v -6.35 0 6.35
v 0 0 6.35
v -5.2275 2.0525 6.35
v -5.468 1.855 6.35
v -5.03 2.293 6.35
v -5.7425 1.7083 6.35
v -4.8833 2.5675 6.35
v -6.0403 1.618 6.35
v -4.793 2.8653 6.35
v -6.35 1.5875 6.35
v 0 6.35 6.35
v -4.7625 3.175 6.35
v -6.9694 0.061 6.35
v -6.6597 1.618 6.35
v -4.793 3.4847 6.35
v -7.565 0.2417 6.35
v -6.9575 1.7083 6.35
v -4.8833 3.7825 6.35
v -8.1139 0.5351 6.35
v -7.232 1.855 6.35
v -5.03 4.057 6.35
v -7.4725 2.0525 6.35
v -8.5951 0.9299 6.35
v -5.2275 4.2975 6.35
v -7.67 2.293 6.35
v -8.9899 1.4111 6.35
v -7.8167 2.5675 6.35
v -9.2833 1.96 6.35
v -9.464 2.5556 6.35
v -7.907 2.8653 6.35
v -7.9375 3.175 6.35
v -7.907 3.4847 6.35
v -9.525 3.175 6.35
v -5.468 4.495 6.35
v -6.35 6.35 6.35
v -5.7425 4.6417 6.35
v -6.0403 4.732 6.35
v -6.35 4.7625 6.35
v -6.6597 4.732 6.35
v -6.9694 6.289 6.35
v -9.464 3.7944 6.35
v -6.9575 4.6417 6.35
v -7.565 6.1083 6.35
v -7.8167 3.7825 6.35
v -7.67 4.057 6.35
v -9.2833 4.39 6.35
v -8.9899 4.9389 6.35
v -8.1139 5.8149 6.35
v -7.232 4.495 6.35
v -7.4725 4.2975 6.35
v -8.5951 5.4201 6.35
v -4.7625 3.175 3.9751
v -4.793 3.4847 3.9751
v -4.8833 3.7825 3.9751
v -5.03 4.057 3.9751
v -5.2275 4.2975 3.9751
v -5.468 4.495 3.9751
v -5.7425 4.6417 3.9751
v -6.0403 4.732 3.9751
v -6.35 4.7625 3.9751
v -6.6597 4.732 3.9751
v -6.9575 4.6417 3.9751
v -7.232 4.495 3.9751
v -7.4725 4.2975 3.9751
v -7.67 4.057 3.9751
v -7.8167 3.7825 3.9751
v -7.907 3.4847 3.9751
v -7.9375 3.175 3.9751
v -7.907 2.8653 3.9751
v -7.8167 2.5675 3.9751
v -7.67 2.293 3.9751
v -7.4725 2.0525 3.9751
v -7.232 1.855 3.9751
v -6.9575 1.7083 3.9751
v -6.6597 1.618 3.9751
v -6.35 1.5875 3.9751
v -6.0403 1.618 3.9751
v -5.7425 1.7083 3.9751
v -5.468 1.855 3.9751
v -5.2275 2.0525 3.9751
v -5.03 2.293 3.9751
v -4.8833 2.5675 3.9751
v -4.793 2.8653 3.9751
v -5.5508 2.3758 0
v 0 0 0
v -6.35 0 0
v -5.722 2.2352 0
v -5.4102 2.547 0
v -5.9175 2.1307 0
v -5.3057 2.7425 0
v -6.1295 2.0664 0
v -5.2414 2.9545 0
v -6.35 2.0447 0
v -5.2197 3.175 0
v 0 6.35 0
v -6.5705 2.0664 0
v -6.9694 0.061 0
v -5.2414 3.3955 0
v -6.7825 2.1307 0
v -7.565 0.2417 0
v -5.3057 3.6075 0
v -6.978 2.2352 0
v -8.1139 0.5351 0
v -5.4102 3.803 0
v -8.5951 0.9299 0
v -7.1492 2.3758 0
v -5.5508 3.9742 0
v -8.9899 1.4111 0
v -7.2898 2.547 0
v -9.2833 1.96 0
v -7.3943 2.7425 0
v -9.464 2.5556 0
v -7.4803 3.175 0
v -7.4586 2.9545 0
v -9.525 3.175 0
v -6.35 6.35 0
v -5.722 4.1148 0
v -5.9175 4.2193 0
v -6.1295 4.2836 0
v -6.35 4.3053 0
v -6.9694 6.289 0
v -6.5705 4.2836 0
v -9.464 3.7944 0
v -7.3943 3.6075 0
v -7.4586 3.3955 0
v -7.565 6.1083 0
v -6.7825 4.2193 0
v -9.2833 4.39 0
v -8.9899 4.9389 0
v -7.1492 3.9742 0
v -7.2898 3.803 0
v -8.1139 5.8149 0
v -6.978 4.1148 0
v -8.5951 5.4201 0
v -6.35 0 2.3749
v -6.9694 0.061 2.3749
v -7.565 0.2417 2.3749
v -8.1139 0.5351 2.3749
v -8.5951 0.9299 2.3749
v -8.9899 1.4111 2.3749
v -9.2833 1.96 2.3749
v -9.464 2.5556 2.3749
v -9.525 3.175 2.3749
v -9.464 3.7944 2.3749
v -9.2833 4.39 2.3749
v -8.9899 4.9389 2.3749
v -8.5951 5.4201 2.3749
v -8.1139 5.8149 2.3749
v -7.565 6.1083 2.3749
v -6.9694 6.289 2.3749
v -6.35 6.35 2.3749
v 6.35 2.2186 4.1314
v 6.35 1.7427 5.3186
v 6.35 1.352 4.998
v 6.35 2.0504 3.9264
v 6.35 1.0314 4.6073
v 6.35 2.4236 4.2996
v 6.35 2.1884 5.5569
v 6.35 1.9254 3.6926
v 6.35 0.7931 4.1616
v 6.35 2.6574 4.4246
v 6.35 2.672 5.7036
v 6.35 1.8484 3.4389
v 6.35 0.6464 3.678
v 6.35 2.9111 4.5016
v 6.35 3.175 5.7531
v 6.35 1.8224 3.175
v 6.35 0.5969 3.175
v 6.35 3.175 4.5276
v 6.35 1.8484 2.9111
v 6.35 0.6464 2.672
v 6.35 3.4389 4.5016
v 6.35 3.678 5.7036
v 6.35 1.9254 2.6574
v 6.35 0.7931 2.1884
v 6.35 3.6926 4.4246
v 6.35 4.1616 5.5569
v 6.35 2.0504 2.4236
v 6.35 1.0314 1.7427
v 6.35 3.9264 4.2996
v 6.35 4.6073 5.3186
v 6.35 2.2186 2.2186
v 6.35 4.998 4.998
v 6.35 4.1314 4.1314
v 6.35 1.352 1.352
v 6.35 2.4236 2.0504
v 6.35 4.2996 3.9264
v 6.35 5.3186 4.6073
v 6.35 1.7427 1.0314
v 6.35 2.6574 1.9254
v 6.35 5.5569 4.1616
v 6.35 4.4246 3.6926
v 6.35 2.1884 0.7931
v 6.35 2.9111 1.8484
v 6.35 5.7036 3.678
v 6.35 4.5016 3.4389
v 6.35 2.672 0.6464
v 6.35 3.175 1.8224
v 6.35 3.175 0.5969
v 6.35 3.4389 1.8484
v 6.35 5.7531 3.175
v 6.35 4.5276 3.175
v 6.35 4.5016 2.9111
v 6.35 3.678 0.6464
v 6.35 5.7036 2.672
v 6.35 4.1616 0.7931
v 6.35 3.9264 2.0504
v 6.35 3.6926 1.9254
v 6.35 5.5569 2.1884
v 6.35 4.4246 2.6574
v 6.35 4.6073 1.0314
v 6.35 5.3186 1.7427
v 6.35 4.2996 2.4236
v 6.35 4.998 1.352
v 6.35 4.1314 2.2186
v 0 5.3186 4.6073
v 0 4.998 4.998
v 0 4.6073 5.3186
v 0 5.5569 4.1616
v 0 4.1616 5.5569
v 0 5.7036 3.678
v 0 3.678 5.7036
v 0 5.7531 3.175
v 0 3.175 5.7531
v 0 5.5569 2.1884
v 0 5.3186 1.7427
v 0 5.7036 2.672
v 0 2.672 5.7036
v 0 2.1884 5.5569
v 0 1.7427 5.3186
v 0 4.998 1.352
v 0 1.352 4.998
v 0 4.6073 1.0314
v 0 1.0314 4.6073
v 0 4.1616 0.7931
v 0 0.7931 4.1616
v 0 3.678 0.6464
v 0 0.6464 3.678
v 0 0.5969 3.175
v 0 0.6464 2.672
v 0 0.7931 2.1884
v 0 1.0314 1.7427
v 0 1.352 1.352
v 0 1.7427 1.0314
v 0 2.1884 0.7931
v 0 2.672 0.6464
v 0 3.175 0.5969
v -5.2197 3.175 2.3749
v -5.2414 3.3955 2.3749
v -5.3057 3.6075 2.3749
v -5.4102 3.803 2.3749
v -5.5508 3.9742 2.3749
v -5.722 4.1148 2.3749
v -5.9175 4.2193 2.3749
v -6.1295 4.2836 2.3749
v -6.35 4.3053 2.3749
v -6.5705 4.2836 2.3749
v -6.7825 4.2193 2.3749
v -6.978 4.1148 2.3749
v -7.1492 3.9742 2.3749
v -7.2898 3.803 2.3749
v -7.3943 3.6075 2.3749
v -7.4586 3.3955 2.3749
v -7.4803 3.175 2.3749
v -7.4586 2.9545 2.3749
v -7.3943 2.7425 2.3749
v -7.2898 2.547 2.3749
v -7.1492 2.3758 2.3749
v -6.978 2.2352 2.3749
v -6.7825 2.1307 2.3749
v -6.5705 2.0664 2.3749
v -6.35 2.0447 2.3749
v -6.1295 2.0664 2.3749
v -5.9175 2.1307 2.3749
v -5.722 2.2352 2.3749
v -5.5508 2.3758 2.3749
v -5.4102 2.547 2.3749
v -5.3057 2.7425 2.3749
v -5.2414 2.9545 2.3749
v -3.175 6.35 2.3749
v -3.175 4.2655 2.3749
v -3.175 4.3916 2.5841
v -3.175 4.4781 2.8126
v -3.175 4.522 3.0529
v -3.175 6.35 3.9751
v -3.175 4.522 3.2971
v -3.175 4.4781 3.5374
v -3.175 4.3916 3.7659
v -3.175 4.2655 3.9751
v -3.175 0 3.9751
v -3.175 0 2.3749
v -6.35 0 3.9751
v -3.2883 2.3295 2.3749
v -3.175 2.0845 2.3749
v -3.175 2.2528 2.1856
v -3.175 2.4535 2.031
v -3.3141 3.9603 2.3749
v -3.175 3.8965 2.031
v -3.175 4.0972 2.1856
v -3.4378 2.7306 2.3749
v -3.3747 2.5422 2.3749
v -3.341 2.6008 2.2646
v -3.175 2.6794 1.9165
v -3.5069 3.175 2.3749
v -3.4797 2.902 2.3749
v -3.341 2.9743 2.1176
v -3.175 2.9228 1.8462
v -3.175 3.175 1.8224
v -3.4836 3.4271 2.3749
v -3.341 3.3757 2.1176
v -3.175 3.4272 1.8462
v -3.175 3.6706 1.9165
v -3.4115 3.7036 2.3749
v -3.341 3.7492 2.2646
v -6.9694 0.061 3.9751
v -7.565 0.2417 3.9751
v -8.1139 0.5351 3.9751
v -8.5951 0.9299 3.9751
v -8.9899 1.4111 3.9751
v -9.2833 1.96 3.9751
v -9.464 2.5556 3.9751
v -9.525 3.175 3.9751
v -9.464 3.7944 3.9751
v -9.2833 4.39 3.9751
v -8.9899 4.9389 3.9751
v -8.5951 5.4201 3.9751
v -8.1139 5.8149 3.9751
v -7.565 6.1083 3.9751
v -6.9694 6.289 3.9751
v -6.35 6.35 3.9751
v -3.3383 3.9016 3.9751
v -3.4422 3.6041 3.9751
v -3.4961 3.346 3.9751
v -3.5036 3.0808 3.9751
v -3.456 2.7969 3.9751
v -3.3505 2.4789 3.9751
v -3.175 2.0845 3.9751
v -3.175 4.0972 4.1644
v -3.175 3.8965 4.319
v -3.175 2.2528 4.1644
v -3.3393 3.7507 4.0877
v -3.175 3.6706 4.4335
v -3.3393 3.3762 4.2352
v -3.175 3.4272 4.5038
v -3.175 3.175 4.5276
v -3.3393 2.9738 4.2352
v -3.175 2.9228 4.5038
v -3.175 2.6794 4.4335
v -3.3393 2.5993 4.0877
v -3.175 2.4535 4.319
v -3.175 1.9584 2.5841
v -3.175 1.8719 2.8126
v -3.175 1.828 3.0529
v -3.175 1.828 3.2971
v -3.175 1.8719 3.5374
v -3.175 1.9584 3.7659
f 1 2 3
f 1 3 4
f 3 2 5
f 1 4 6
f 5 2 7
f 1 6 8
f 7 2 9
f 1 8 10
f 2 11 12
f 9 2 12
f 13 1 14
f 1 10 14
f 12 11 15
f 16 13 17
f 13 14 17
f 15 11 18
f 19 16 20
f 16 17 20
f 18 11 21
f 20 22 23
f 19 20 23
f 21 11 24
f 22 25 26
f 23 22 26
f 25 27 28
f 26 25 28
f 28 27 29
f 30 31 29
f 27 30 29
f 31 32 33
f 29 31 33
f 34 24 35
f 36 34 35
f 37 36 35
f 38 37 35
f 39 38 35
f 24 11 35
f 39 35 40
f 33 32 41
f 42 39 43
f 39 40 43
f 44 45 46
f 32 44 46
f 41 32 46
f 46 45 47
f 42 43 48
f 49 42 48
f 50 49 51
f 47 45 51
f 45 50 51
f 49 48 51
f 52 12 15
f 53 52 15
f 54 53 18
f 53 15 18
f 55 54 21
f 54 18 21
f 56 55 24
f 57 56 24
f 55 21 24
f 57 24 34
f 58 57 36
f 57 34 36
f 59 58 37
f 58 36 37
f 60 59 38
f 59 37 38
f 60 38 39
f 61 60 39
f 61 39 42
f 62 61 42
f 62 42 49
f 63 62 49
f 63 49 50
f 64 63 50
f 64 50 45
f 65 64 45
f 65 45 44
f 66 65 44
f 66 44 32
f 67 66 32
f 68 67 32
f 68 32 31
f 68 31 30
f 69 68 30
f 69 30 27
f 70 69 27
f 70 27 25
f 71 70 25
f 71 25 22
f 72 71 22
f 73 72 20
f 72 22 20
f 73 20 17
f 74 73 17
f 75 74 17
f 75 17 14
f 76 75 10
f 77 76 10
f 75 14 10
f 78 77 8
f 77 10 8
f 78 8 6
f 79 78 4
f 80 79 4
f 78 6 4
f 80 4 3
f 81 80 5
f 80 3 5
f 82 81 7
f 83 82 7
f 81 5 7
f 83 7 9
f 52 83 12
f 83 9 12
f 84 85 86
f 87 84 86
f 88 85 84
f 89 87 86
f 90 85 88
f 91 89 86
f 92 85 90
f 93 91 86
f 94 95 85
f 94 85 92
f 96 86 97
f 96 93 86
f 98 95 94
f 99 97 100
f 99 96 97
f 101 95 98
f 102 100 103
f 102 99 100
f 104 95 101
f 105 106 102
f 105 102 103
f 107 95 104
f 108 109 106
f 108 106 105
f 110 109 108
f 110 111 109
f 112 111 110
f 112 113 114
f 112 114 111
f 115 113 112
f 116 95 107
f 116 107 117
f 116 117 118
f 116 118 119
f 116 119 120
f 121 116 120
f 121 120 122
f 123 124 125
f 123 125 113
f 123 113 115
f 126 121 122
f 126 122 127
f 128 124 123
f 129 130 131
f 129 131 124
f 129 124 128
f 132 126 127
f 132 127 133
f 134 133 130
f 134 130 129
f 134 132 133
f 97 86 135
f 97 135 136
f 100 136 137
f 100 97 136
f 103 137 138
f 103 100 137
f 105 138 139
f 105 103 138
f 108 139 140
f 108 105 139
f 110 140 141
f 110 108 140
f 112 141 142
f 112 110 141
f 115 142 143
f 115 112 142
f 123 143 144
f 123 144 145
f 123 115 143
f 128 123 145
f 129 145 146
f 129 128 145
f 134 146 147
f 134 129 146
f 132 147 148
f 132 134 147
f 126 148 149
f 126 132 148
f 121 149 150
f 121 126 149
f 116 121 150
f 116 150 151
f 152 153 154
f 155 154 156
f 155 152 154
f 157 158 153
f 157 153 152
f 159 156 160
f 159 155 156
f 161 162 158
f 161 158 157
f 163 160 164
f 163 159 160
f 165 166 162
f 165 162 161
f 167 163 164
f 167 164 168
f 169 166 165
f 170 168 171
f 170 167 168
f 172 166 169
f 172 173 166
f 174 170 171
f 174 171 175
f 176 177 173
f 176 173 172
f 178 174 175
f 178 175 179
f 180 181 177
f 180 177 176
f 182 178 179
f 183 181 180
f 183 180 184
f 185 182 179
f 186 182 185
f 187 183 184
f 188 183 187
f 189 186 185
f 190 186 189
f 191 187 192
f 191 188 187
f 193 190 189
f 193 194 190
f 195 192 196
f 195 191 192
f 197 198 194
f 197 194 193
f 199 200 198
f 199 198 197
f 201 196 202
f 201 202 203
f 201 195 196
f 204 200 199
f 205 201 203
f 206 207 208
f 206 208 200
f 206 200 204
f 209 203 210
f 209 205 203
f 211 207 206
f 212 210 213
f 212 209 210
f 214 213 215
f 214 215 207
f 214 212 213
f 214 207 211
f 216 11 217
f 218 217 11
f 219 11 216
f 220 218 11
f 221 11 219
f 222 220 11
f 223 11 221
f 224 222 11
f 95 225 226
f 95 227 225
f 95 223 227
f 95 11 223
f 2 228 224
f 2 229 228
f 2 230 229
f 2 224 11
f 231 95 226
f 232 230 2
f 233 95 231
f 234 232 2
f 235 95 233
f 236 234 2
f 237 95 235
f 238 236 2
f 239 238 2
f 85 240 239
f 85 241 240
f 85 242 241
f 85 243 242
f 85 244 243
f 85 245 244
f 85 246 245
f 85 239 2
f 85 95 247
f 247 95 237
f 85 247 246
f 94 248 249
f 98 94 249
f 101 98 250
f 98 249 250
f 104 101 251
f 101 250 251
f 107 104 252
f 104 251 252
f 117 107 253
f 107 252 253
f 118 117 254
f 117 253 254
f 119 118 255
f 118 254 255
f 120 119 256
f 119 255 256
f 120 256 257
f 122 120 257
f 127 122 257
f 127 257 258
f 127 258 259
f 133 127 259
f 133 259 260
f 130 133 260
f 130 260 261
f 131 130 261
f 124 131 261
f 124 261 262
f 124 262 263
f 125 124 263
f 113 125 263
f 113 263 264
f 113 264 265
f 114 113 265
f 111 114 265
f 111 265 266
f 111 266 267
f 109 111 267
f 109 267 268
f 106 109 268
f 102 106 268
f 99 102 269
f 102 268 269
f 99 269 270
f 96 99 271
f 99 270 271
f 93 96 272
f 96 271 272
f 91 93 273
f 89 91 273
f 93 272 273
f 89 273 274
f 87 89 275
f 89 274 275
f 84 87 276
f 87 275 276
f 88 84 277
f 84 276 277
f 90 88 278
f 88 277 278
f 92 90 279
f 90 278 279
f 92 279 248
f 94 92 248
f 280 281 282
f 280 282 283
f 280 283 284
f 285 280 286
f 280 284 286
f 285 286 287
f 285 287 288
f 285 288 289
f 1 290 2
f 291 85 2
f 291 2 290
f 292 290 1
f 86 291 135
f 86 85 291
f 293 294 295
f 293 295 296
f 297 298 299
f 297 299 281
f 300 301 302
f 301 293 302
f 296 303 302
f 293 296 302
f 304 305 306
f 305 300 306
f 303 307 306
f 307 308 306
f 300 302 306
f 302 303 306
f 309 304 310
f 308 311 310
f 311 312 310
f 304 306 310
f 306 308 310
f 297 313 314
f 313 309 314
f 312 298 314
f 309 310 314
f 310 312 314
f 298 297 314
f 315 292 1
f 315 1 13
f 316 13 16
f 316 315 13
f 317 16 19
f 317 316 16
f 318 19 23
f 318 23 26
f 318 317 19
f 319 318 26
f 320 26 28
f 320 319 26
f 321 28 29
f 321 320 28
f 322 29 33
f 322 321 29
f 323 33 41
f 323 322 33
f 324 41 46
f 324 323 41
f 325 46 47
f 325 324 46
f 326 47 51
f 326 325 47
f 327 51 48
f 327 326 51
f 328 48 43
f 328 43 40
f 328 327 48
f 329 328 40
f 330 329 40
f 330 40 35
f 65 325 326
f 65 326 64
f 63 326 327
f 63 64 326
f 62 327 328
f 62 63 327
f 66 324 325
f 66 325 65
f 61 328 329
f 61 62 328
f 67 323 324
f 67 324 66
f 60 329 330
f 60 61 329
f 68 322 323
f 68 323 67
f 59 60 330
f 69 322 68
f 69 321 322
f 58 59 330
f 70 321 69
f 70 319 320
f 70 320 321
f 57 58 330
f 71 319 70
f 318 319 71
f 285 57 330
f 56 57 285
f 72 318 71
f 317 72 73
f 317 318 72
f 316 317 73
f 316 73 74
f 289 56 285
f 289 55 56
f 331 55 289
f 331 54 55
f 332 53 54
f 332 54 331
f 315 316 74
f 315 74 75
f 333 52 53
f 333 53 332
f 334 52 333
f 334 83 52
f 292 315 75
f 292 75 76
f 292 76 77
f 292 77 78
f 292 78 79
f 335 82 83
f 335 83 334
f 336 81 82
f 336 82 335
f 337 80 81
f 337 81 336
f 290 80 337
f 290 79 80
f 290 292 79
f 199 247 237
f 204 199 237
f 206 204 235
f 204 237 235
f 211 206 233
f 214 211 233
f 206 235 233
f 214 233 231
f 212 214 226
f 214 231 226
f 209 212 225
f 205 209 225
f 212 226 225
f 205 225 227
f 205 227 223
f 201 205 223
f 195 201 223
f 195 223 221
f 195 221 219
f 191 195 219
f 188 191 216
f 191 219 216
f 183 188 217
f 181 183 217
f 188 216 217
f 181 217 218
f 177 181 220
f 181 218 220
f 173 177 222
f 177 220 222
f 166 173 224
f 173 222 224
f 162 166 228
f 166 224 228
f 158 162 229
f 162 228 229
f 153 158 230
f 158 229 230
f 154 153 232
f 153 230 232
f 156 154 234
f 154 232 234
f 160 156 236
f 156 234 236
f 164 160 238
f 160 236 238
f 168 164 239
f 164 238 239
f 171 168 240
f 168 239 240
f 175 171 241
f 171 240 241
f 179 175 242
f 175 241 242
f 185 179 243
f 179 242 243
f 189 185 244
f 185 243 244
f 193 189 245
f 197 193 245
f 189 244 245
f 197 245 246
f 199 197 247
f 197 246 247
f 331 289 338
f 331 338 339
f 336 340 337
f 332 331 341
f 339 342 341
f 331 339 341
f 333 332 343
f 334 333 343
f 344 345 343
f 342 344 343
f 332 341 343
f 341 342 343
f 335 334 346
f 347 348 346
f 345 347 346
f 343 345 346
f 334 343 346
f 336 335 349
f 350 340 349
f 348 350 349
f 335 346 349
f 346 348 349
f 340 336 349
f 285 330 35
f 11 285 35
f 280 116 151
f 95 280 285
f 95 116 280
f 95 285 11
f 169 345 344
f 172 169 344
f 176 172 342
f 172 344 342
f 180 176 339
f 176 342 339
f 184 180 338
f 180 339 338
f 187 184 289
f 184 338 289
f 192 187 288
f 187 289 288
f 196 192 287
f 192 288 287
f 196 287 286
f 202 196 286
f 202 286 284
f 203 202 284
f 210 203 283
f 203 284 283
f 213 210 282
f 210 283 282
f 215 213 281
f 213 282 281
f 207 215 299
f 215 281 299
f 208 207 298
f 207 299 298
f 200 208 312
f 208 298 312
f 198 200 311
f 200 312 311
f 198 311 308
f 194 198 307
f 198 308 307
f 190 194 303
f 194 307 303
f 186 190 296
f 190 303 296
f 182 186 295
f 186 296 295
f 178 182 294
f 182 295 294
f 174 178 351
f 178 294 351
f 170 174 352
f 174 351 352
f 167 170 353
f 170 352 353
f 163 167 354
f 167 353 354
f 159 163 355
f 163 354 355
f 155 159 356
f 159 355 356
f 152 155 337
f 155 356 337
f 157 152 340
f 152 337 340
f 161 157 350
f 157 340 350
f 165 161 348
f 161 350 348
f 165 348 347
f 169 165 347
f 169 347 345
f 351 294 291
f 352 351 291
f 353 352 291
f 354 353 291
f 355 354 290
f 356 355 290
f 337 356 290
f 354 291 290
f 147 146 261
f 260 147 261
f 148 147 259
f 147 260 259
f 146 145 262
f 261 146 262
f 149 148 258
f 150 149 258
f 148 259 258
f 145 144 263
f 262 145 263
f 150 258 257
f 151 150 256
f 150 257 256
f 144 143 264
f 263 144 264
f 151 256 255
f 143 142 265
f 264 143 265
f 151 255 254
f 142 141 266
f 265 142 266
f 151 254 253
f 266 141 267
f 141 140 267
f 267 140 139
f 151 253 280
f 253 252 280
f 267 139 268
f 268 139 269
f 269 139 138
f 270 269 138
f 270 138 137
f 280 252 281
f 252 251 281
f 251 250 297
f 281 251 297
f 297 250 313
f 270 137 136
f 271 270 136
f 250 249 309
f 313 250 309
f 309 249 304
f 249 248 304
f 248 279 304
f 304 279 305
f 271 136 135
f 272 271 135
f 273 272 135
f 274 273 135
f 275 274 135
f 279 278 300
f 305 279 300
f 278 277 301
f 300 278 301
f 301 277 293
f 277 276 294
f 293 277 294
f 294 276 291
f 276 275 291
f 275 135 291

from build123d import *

# Parameters (mm, degrees)
BOSS_EXTRUDE1_DEPTH           = 6.35
SKETCH2_R                     = 2.5781
BOSS_EXTRUDE2_DEPTH           = 6.35
TAP_DRILL_FOR_6_32_TAP1_D     = 2.7051
TAP_DRILL_FOR_6_32_TAP1_DEPTH = 9.525
TAP_DRILL_FOR_6_32_TAP1_TIP   = 0.81269403
CUT_EXTRUDE1_REACH            = 15.091
SKETCH5_W                     = 10.16
SKETCH5_H                     = 1.6002
CUT_EXTRUDE2_REACH            = 15.091
SKETCH6_R                     = 1.5875
F_4_40_TAPPED_HOLE1_D         = 2.2606


with BuildPart() as part:
    # Sketch1 → Boss-Extrude1 (new body)
    with BuildSketch(Plane.XY):
        with BuildLine():
            Line((0, 0), (-6.35, 0))
            ThreePointArc((-6.35, 0), (-9.525, 3.175), (-6.35, 6.35))
            Line((-6.35, 6.35), (0, 6.35))
            Line((0, 6.35), (0, 0))
        make_face()
    extrude(amount=BOSS_EXTRUDE1_DEPTH)

    # Sketch2 → Boss-Extrude2 (add)
    with BuildSketch(Plane(origin=(0, 0, 0), x_dir=(0, 0, -1), z_dir=(1, 0, 0))):
        with Locations((-3.175, 3.175)):
            Circle(SKETCH2_R)
    extrude(amount=BOSS_EXTRUDE2_DEPTH)

    # Tap Drill for #6-32 Tap1
    with Locations(Plane(origin=(6.35, 0, 0), x_dir=(0, 0, -1), z_dir=(1, 0, 0))):
        with Locations((-3.175, 3.175)):
            Hole(TAP_DRILL_FOR_6_32_TAP1_D / 2, depth=TAP_DRILL_FOR_6_32_TAP1_DEPTH)
            with Locations((0, 0, -(TAP_DRILL_FOR_6_32_TAP1_DEPTH + TAP_DRILL_FOR_6_32_TAP1_TIP / 2))):  # 118° drill point
                Cone(0, TAP_DRILL_FOR_6_32_TAP1_D / 2, TAP_DRILL_FOR_6_32_TAP1_TIP, mode=Mode.SUBTRACT)

    # Sketch5 → Cut-Extrude1 (cut, up to next)
    with BuildSketch(Plane.XZ, mode=Mode.PRIVATE) as cut_extrude1_sk1:
        with Locations((-8.255, 3.175)):
            Rectangle(SKETCH5_W, SKETCH5_H)
    cut_extrude1_tool1 = extrude(cut_extrude1_sk1.sketch, amount=-CUT_EXTRUDE1_REACH, mode=Mode.PRIVATE) & part.part
    add(cut_extrude1_tool1.solids().sort_by_distance((-8.255, 0, 3.175))[0], mode=Mode.SUBTRACT)

    # Sketch6 → Cut-Extrude2 (cut, up to next)
    with BuildSketch(Plane.XY.offset(6.35), mode=Mode.PRIVATE) as cut_extrude2_sk1:
        with Locations((-6.35, 3.175)):
            Circle(SKETCH6_R)
    cut_extrude2_tool1 = extrude(cut_extrude2_sk1.sketch, amount=-CUT_EXTRUDE2_REACH, mode=Mode.PRIVATE) & part.part
    add(cut_extrude2_tool1.solids().sort_by_distance((-6.35, 3.175, 6.35))[0], mode=Mode.SUBTRACT)

    # #4-40 Tapped Hole1 (through all)
    with Locations(Plane(origin=(0, 0, 0), x_dir=(-1, 0, 0), z_dir=(0, 0, -1))):
        with Locations((6.35, 3.175)):
            Hole(F_4_40_TAPPED_HOLE1_D / 2)


solid = part.part
